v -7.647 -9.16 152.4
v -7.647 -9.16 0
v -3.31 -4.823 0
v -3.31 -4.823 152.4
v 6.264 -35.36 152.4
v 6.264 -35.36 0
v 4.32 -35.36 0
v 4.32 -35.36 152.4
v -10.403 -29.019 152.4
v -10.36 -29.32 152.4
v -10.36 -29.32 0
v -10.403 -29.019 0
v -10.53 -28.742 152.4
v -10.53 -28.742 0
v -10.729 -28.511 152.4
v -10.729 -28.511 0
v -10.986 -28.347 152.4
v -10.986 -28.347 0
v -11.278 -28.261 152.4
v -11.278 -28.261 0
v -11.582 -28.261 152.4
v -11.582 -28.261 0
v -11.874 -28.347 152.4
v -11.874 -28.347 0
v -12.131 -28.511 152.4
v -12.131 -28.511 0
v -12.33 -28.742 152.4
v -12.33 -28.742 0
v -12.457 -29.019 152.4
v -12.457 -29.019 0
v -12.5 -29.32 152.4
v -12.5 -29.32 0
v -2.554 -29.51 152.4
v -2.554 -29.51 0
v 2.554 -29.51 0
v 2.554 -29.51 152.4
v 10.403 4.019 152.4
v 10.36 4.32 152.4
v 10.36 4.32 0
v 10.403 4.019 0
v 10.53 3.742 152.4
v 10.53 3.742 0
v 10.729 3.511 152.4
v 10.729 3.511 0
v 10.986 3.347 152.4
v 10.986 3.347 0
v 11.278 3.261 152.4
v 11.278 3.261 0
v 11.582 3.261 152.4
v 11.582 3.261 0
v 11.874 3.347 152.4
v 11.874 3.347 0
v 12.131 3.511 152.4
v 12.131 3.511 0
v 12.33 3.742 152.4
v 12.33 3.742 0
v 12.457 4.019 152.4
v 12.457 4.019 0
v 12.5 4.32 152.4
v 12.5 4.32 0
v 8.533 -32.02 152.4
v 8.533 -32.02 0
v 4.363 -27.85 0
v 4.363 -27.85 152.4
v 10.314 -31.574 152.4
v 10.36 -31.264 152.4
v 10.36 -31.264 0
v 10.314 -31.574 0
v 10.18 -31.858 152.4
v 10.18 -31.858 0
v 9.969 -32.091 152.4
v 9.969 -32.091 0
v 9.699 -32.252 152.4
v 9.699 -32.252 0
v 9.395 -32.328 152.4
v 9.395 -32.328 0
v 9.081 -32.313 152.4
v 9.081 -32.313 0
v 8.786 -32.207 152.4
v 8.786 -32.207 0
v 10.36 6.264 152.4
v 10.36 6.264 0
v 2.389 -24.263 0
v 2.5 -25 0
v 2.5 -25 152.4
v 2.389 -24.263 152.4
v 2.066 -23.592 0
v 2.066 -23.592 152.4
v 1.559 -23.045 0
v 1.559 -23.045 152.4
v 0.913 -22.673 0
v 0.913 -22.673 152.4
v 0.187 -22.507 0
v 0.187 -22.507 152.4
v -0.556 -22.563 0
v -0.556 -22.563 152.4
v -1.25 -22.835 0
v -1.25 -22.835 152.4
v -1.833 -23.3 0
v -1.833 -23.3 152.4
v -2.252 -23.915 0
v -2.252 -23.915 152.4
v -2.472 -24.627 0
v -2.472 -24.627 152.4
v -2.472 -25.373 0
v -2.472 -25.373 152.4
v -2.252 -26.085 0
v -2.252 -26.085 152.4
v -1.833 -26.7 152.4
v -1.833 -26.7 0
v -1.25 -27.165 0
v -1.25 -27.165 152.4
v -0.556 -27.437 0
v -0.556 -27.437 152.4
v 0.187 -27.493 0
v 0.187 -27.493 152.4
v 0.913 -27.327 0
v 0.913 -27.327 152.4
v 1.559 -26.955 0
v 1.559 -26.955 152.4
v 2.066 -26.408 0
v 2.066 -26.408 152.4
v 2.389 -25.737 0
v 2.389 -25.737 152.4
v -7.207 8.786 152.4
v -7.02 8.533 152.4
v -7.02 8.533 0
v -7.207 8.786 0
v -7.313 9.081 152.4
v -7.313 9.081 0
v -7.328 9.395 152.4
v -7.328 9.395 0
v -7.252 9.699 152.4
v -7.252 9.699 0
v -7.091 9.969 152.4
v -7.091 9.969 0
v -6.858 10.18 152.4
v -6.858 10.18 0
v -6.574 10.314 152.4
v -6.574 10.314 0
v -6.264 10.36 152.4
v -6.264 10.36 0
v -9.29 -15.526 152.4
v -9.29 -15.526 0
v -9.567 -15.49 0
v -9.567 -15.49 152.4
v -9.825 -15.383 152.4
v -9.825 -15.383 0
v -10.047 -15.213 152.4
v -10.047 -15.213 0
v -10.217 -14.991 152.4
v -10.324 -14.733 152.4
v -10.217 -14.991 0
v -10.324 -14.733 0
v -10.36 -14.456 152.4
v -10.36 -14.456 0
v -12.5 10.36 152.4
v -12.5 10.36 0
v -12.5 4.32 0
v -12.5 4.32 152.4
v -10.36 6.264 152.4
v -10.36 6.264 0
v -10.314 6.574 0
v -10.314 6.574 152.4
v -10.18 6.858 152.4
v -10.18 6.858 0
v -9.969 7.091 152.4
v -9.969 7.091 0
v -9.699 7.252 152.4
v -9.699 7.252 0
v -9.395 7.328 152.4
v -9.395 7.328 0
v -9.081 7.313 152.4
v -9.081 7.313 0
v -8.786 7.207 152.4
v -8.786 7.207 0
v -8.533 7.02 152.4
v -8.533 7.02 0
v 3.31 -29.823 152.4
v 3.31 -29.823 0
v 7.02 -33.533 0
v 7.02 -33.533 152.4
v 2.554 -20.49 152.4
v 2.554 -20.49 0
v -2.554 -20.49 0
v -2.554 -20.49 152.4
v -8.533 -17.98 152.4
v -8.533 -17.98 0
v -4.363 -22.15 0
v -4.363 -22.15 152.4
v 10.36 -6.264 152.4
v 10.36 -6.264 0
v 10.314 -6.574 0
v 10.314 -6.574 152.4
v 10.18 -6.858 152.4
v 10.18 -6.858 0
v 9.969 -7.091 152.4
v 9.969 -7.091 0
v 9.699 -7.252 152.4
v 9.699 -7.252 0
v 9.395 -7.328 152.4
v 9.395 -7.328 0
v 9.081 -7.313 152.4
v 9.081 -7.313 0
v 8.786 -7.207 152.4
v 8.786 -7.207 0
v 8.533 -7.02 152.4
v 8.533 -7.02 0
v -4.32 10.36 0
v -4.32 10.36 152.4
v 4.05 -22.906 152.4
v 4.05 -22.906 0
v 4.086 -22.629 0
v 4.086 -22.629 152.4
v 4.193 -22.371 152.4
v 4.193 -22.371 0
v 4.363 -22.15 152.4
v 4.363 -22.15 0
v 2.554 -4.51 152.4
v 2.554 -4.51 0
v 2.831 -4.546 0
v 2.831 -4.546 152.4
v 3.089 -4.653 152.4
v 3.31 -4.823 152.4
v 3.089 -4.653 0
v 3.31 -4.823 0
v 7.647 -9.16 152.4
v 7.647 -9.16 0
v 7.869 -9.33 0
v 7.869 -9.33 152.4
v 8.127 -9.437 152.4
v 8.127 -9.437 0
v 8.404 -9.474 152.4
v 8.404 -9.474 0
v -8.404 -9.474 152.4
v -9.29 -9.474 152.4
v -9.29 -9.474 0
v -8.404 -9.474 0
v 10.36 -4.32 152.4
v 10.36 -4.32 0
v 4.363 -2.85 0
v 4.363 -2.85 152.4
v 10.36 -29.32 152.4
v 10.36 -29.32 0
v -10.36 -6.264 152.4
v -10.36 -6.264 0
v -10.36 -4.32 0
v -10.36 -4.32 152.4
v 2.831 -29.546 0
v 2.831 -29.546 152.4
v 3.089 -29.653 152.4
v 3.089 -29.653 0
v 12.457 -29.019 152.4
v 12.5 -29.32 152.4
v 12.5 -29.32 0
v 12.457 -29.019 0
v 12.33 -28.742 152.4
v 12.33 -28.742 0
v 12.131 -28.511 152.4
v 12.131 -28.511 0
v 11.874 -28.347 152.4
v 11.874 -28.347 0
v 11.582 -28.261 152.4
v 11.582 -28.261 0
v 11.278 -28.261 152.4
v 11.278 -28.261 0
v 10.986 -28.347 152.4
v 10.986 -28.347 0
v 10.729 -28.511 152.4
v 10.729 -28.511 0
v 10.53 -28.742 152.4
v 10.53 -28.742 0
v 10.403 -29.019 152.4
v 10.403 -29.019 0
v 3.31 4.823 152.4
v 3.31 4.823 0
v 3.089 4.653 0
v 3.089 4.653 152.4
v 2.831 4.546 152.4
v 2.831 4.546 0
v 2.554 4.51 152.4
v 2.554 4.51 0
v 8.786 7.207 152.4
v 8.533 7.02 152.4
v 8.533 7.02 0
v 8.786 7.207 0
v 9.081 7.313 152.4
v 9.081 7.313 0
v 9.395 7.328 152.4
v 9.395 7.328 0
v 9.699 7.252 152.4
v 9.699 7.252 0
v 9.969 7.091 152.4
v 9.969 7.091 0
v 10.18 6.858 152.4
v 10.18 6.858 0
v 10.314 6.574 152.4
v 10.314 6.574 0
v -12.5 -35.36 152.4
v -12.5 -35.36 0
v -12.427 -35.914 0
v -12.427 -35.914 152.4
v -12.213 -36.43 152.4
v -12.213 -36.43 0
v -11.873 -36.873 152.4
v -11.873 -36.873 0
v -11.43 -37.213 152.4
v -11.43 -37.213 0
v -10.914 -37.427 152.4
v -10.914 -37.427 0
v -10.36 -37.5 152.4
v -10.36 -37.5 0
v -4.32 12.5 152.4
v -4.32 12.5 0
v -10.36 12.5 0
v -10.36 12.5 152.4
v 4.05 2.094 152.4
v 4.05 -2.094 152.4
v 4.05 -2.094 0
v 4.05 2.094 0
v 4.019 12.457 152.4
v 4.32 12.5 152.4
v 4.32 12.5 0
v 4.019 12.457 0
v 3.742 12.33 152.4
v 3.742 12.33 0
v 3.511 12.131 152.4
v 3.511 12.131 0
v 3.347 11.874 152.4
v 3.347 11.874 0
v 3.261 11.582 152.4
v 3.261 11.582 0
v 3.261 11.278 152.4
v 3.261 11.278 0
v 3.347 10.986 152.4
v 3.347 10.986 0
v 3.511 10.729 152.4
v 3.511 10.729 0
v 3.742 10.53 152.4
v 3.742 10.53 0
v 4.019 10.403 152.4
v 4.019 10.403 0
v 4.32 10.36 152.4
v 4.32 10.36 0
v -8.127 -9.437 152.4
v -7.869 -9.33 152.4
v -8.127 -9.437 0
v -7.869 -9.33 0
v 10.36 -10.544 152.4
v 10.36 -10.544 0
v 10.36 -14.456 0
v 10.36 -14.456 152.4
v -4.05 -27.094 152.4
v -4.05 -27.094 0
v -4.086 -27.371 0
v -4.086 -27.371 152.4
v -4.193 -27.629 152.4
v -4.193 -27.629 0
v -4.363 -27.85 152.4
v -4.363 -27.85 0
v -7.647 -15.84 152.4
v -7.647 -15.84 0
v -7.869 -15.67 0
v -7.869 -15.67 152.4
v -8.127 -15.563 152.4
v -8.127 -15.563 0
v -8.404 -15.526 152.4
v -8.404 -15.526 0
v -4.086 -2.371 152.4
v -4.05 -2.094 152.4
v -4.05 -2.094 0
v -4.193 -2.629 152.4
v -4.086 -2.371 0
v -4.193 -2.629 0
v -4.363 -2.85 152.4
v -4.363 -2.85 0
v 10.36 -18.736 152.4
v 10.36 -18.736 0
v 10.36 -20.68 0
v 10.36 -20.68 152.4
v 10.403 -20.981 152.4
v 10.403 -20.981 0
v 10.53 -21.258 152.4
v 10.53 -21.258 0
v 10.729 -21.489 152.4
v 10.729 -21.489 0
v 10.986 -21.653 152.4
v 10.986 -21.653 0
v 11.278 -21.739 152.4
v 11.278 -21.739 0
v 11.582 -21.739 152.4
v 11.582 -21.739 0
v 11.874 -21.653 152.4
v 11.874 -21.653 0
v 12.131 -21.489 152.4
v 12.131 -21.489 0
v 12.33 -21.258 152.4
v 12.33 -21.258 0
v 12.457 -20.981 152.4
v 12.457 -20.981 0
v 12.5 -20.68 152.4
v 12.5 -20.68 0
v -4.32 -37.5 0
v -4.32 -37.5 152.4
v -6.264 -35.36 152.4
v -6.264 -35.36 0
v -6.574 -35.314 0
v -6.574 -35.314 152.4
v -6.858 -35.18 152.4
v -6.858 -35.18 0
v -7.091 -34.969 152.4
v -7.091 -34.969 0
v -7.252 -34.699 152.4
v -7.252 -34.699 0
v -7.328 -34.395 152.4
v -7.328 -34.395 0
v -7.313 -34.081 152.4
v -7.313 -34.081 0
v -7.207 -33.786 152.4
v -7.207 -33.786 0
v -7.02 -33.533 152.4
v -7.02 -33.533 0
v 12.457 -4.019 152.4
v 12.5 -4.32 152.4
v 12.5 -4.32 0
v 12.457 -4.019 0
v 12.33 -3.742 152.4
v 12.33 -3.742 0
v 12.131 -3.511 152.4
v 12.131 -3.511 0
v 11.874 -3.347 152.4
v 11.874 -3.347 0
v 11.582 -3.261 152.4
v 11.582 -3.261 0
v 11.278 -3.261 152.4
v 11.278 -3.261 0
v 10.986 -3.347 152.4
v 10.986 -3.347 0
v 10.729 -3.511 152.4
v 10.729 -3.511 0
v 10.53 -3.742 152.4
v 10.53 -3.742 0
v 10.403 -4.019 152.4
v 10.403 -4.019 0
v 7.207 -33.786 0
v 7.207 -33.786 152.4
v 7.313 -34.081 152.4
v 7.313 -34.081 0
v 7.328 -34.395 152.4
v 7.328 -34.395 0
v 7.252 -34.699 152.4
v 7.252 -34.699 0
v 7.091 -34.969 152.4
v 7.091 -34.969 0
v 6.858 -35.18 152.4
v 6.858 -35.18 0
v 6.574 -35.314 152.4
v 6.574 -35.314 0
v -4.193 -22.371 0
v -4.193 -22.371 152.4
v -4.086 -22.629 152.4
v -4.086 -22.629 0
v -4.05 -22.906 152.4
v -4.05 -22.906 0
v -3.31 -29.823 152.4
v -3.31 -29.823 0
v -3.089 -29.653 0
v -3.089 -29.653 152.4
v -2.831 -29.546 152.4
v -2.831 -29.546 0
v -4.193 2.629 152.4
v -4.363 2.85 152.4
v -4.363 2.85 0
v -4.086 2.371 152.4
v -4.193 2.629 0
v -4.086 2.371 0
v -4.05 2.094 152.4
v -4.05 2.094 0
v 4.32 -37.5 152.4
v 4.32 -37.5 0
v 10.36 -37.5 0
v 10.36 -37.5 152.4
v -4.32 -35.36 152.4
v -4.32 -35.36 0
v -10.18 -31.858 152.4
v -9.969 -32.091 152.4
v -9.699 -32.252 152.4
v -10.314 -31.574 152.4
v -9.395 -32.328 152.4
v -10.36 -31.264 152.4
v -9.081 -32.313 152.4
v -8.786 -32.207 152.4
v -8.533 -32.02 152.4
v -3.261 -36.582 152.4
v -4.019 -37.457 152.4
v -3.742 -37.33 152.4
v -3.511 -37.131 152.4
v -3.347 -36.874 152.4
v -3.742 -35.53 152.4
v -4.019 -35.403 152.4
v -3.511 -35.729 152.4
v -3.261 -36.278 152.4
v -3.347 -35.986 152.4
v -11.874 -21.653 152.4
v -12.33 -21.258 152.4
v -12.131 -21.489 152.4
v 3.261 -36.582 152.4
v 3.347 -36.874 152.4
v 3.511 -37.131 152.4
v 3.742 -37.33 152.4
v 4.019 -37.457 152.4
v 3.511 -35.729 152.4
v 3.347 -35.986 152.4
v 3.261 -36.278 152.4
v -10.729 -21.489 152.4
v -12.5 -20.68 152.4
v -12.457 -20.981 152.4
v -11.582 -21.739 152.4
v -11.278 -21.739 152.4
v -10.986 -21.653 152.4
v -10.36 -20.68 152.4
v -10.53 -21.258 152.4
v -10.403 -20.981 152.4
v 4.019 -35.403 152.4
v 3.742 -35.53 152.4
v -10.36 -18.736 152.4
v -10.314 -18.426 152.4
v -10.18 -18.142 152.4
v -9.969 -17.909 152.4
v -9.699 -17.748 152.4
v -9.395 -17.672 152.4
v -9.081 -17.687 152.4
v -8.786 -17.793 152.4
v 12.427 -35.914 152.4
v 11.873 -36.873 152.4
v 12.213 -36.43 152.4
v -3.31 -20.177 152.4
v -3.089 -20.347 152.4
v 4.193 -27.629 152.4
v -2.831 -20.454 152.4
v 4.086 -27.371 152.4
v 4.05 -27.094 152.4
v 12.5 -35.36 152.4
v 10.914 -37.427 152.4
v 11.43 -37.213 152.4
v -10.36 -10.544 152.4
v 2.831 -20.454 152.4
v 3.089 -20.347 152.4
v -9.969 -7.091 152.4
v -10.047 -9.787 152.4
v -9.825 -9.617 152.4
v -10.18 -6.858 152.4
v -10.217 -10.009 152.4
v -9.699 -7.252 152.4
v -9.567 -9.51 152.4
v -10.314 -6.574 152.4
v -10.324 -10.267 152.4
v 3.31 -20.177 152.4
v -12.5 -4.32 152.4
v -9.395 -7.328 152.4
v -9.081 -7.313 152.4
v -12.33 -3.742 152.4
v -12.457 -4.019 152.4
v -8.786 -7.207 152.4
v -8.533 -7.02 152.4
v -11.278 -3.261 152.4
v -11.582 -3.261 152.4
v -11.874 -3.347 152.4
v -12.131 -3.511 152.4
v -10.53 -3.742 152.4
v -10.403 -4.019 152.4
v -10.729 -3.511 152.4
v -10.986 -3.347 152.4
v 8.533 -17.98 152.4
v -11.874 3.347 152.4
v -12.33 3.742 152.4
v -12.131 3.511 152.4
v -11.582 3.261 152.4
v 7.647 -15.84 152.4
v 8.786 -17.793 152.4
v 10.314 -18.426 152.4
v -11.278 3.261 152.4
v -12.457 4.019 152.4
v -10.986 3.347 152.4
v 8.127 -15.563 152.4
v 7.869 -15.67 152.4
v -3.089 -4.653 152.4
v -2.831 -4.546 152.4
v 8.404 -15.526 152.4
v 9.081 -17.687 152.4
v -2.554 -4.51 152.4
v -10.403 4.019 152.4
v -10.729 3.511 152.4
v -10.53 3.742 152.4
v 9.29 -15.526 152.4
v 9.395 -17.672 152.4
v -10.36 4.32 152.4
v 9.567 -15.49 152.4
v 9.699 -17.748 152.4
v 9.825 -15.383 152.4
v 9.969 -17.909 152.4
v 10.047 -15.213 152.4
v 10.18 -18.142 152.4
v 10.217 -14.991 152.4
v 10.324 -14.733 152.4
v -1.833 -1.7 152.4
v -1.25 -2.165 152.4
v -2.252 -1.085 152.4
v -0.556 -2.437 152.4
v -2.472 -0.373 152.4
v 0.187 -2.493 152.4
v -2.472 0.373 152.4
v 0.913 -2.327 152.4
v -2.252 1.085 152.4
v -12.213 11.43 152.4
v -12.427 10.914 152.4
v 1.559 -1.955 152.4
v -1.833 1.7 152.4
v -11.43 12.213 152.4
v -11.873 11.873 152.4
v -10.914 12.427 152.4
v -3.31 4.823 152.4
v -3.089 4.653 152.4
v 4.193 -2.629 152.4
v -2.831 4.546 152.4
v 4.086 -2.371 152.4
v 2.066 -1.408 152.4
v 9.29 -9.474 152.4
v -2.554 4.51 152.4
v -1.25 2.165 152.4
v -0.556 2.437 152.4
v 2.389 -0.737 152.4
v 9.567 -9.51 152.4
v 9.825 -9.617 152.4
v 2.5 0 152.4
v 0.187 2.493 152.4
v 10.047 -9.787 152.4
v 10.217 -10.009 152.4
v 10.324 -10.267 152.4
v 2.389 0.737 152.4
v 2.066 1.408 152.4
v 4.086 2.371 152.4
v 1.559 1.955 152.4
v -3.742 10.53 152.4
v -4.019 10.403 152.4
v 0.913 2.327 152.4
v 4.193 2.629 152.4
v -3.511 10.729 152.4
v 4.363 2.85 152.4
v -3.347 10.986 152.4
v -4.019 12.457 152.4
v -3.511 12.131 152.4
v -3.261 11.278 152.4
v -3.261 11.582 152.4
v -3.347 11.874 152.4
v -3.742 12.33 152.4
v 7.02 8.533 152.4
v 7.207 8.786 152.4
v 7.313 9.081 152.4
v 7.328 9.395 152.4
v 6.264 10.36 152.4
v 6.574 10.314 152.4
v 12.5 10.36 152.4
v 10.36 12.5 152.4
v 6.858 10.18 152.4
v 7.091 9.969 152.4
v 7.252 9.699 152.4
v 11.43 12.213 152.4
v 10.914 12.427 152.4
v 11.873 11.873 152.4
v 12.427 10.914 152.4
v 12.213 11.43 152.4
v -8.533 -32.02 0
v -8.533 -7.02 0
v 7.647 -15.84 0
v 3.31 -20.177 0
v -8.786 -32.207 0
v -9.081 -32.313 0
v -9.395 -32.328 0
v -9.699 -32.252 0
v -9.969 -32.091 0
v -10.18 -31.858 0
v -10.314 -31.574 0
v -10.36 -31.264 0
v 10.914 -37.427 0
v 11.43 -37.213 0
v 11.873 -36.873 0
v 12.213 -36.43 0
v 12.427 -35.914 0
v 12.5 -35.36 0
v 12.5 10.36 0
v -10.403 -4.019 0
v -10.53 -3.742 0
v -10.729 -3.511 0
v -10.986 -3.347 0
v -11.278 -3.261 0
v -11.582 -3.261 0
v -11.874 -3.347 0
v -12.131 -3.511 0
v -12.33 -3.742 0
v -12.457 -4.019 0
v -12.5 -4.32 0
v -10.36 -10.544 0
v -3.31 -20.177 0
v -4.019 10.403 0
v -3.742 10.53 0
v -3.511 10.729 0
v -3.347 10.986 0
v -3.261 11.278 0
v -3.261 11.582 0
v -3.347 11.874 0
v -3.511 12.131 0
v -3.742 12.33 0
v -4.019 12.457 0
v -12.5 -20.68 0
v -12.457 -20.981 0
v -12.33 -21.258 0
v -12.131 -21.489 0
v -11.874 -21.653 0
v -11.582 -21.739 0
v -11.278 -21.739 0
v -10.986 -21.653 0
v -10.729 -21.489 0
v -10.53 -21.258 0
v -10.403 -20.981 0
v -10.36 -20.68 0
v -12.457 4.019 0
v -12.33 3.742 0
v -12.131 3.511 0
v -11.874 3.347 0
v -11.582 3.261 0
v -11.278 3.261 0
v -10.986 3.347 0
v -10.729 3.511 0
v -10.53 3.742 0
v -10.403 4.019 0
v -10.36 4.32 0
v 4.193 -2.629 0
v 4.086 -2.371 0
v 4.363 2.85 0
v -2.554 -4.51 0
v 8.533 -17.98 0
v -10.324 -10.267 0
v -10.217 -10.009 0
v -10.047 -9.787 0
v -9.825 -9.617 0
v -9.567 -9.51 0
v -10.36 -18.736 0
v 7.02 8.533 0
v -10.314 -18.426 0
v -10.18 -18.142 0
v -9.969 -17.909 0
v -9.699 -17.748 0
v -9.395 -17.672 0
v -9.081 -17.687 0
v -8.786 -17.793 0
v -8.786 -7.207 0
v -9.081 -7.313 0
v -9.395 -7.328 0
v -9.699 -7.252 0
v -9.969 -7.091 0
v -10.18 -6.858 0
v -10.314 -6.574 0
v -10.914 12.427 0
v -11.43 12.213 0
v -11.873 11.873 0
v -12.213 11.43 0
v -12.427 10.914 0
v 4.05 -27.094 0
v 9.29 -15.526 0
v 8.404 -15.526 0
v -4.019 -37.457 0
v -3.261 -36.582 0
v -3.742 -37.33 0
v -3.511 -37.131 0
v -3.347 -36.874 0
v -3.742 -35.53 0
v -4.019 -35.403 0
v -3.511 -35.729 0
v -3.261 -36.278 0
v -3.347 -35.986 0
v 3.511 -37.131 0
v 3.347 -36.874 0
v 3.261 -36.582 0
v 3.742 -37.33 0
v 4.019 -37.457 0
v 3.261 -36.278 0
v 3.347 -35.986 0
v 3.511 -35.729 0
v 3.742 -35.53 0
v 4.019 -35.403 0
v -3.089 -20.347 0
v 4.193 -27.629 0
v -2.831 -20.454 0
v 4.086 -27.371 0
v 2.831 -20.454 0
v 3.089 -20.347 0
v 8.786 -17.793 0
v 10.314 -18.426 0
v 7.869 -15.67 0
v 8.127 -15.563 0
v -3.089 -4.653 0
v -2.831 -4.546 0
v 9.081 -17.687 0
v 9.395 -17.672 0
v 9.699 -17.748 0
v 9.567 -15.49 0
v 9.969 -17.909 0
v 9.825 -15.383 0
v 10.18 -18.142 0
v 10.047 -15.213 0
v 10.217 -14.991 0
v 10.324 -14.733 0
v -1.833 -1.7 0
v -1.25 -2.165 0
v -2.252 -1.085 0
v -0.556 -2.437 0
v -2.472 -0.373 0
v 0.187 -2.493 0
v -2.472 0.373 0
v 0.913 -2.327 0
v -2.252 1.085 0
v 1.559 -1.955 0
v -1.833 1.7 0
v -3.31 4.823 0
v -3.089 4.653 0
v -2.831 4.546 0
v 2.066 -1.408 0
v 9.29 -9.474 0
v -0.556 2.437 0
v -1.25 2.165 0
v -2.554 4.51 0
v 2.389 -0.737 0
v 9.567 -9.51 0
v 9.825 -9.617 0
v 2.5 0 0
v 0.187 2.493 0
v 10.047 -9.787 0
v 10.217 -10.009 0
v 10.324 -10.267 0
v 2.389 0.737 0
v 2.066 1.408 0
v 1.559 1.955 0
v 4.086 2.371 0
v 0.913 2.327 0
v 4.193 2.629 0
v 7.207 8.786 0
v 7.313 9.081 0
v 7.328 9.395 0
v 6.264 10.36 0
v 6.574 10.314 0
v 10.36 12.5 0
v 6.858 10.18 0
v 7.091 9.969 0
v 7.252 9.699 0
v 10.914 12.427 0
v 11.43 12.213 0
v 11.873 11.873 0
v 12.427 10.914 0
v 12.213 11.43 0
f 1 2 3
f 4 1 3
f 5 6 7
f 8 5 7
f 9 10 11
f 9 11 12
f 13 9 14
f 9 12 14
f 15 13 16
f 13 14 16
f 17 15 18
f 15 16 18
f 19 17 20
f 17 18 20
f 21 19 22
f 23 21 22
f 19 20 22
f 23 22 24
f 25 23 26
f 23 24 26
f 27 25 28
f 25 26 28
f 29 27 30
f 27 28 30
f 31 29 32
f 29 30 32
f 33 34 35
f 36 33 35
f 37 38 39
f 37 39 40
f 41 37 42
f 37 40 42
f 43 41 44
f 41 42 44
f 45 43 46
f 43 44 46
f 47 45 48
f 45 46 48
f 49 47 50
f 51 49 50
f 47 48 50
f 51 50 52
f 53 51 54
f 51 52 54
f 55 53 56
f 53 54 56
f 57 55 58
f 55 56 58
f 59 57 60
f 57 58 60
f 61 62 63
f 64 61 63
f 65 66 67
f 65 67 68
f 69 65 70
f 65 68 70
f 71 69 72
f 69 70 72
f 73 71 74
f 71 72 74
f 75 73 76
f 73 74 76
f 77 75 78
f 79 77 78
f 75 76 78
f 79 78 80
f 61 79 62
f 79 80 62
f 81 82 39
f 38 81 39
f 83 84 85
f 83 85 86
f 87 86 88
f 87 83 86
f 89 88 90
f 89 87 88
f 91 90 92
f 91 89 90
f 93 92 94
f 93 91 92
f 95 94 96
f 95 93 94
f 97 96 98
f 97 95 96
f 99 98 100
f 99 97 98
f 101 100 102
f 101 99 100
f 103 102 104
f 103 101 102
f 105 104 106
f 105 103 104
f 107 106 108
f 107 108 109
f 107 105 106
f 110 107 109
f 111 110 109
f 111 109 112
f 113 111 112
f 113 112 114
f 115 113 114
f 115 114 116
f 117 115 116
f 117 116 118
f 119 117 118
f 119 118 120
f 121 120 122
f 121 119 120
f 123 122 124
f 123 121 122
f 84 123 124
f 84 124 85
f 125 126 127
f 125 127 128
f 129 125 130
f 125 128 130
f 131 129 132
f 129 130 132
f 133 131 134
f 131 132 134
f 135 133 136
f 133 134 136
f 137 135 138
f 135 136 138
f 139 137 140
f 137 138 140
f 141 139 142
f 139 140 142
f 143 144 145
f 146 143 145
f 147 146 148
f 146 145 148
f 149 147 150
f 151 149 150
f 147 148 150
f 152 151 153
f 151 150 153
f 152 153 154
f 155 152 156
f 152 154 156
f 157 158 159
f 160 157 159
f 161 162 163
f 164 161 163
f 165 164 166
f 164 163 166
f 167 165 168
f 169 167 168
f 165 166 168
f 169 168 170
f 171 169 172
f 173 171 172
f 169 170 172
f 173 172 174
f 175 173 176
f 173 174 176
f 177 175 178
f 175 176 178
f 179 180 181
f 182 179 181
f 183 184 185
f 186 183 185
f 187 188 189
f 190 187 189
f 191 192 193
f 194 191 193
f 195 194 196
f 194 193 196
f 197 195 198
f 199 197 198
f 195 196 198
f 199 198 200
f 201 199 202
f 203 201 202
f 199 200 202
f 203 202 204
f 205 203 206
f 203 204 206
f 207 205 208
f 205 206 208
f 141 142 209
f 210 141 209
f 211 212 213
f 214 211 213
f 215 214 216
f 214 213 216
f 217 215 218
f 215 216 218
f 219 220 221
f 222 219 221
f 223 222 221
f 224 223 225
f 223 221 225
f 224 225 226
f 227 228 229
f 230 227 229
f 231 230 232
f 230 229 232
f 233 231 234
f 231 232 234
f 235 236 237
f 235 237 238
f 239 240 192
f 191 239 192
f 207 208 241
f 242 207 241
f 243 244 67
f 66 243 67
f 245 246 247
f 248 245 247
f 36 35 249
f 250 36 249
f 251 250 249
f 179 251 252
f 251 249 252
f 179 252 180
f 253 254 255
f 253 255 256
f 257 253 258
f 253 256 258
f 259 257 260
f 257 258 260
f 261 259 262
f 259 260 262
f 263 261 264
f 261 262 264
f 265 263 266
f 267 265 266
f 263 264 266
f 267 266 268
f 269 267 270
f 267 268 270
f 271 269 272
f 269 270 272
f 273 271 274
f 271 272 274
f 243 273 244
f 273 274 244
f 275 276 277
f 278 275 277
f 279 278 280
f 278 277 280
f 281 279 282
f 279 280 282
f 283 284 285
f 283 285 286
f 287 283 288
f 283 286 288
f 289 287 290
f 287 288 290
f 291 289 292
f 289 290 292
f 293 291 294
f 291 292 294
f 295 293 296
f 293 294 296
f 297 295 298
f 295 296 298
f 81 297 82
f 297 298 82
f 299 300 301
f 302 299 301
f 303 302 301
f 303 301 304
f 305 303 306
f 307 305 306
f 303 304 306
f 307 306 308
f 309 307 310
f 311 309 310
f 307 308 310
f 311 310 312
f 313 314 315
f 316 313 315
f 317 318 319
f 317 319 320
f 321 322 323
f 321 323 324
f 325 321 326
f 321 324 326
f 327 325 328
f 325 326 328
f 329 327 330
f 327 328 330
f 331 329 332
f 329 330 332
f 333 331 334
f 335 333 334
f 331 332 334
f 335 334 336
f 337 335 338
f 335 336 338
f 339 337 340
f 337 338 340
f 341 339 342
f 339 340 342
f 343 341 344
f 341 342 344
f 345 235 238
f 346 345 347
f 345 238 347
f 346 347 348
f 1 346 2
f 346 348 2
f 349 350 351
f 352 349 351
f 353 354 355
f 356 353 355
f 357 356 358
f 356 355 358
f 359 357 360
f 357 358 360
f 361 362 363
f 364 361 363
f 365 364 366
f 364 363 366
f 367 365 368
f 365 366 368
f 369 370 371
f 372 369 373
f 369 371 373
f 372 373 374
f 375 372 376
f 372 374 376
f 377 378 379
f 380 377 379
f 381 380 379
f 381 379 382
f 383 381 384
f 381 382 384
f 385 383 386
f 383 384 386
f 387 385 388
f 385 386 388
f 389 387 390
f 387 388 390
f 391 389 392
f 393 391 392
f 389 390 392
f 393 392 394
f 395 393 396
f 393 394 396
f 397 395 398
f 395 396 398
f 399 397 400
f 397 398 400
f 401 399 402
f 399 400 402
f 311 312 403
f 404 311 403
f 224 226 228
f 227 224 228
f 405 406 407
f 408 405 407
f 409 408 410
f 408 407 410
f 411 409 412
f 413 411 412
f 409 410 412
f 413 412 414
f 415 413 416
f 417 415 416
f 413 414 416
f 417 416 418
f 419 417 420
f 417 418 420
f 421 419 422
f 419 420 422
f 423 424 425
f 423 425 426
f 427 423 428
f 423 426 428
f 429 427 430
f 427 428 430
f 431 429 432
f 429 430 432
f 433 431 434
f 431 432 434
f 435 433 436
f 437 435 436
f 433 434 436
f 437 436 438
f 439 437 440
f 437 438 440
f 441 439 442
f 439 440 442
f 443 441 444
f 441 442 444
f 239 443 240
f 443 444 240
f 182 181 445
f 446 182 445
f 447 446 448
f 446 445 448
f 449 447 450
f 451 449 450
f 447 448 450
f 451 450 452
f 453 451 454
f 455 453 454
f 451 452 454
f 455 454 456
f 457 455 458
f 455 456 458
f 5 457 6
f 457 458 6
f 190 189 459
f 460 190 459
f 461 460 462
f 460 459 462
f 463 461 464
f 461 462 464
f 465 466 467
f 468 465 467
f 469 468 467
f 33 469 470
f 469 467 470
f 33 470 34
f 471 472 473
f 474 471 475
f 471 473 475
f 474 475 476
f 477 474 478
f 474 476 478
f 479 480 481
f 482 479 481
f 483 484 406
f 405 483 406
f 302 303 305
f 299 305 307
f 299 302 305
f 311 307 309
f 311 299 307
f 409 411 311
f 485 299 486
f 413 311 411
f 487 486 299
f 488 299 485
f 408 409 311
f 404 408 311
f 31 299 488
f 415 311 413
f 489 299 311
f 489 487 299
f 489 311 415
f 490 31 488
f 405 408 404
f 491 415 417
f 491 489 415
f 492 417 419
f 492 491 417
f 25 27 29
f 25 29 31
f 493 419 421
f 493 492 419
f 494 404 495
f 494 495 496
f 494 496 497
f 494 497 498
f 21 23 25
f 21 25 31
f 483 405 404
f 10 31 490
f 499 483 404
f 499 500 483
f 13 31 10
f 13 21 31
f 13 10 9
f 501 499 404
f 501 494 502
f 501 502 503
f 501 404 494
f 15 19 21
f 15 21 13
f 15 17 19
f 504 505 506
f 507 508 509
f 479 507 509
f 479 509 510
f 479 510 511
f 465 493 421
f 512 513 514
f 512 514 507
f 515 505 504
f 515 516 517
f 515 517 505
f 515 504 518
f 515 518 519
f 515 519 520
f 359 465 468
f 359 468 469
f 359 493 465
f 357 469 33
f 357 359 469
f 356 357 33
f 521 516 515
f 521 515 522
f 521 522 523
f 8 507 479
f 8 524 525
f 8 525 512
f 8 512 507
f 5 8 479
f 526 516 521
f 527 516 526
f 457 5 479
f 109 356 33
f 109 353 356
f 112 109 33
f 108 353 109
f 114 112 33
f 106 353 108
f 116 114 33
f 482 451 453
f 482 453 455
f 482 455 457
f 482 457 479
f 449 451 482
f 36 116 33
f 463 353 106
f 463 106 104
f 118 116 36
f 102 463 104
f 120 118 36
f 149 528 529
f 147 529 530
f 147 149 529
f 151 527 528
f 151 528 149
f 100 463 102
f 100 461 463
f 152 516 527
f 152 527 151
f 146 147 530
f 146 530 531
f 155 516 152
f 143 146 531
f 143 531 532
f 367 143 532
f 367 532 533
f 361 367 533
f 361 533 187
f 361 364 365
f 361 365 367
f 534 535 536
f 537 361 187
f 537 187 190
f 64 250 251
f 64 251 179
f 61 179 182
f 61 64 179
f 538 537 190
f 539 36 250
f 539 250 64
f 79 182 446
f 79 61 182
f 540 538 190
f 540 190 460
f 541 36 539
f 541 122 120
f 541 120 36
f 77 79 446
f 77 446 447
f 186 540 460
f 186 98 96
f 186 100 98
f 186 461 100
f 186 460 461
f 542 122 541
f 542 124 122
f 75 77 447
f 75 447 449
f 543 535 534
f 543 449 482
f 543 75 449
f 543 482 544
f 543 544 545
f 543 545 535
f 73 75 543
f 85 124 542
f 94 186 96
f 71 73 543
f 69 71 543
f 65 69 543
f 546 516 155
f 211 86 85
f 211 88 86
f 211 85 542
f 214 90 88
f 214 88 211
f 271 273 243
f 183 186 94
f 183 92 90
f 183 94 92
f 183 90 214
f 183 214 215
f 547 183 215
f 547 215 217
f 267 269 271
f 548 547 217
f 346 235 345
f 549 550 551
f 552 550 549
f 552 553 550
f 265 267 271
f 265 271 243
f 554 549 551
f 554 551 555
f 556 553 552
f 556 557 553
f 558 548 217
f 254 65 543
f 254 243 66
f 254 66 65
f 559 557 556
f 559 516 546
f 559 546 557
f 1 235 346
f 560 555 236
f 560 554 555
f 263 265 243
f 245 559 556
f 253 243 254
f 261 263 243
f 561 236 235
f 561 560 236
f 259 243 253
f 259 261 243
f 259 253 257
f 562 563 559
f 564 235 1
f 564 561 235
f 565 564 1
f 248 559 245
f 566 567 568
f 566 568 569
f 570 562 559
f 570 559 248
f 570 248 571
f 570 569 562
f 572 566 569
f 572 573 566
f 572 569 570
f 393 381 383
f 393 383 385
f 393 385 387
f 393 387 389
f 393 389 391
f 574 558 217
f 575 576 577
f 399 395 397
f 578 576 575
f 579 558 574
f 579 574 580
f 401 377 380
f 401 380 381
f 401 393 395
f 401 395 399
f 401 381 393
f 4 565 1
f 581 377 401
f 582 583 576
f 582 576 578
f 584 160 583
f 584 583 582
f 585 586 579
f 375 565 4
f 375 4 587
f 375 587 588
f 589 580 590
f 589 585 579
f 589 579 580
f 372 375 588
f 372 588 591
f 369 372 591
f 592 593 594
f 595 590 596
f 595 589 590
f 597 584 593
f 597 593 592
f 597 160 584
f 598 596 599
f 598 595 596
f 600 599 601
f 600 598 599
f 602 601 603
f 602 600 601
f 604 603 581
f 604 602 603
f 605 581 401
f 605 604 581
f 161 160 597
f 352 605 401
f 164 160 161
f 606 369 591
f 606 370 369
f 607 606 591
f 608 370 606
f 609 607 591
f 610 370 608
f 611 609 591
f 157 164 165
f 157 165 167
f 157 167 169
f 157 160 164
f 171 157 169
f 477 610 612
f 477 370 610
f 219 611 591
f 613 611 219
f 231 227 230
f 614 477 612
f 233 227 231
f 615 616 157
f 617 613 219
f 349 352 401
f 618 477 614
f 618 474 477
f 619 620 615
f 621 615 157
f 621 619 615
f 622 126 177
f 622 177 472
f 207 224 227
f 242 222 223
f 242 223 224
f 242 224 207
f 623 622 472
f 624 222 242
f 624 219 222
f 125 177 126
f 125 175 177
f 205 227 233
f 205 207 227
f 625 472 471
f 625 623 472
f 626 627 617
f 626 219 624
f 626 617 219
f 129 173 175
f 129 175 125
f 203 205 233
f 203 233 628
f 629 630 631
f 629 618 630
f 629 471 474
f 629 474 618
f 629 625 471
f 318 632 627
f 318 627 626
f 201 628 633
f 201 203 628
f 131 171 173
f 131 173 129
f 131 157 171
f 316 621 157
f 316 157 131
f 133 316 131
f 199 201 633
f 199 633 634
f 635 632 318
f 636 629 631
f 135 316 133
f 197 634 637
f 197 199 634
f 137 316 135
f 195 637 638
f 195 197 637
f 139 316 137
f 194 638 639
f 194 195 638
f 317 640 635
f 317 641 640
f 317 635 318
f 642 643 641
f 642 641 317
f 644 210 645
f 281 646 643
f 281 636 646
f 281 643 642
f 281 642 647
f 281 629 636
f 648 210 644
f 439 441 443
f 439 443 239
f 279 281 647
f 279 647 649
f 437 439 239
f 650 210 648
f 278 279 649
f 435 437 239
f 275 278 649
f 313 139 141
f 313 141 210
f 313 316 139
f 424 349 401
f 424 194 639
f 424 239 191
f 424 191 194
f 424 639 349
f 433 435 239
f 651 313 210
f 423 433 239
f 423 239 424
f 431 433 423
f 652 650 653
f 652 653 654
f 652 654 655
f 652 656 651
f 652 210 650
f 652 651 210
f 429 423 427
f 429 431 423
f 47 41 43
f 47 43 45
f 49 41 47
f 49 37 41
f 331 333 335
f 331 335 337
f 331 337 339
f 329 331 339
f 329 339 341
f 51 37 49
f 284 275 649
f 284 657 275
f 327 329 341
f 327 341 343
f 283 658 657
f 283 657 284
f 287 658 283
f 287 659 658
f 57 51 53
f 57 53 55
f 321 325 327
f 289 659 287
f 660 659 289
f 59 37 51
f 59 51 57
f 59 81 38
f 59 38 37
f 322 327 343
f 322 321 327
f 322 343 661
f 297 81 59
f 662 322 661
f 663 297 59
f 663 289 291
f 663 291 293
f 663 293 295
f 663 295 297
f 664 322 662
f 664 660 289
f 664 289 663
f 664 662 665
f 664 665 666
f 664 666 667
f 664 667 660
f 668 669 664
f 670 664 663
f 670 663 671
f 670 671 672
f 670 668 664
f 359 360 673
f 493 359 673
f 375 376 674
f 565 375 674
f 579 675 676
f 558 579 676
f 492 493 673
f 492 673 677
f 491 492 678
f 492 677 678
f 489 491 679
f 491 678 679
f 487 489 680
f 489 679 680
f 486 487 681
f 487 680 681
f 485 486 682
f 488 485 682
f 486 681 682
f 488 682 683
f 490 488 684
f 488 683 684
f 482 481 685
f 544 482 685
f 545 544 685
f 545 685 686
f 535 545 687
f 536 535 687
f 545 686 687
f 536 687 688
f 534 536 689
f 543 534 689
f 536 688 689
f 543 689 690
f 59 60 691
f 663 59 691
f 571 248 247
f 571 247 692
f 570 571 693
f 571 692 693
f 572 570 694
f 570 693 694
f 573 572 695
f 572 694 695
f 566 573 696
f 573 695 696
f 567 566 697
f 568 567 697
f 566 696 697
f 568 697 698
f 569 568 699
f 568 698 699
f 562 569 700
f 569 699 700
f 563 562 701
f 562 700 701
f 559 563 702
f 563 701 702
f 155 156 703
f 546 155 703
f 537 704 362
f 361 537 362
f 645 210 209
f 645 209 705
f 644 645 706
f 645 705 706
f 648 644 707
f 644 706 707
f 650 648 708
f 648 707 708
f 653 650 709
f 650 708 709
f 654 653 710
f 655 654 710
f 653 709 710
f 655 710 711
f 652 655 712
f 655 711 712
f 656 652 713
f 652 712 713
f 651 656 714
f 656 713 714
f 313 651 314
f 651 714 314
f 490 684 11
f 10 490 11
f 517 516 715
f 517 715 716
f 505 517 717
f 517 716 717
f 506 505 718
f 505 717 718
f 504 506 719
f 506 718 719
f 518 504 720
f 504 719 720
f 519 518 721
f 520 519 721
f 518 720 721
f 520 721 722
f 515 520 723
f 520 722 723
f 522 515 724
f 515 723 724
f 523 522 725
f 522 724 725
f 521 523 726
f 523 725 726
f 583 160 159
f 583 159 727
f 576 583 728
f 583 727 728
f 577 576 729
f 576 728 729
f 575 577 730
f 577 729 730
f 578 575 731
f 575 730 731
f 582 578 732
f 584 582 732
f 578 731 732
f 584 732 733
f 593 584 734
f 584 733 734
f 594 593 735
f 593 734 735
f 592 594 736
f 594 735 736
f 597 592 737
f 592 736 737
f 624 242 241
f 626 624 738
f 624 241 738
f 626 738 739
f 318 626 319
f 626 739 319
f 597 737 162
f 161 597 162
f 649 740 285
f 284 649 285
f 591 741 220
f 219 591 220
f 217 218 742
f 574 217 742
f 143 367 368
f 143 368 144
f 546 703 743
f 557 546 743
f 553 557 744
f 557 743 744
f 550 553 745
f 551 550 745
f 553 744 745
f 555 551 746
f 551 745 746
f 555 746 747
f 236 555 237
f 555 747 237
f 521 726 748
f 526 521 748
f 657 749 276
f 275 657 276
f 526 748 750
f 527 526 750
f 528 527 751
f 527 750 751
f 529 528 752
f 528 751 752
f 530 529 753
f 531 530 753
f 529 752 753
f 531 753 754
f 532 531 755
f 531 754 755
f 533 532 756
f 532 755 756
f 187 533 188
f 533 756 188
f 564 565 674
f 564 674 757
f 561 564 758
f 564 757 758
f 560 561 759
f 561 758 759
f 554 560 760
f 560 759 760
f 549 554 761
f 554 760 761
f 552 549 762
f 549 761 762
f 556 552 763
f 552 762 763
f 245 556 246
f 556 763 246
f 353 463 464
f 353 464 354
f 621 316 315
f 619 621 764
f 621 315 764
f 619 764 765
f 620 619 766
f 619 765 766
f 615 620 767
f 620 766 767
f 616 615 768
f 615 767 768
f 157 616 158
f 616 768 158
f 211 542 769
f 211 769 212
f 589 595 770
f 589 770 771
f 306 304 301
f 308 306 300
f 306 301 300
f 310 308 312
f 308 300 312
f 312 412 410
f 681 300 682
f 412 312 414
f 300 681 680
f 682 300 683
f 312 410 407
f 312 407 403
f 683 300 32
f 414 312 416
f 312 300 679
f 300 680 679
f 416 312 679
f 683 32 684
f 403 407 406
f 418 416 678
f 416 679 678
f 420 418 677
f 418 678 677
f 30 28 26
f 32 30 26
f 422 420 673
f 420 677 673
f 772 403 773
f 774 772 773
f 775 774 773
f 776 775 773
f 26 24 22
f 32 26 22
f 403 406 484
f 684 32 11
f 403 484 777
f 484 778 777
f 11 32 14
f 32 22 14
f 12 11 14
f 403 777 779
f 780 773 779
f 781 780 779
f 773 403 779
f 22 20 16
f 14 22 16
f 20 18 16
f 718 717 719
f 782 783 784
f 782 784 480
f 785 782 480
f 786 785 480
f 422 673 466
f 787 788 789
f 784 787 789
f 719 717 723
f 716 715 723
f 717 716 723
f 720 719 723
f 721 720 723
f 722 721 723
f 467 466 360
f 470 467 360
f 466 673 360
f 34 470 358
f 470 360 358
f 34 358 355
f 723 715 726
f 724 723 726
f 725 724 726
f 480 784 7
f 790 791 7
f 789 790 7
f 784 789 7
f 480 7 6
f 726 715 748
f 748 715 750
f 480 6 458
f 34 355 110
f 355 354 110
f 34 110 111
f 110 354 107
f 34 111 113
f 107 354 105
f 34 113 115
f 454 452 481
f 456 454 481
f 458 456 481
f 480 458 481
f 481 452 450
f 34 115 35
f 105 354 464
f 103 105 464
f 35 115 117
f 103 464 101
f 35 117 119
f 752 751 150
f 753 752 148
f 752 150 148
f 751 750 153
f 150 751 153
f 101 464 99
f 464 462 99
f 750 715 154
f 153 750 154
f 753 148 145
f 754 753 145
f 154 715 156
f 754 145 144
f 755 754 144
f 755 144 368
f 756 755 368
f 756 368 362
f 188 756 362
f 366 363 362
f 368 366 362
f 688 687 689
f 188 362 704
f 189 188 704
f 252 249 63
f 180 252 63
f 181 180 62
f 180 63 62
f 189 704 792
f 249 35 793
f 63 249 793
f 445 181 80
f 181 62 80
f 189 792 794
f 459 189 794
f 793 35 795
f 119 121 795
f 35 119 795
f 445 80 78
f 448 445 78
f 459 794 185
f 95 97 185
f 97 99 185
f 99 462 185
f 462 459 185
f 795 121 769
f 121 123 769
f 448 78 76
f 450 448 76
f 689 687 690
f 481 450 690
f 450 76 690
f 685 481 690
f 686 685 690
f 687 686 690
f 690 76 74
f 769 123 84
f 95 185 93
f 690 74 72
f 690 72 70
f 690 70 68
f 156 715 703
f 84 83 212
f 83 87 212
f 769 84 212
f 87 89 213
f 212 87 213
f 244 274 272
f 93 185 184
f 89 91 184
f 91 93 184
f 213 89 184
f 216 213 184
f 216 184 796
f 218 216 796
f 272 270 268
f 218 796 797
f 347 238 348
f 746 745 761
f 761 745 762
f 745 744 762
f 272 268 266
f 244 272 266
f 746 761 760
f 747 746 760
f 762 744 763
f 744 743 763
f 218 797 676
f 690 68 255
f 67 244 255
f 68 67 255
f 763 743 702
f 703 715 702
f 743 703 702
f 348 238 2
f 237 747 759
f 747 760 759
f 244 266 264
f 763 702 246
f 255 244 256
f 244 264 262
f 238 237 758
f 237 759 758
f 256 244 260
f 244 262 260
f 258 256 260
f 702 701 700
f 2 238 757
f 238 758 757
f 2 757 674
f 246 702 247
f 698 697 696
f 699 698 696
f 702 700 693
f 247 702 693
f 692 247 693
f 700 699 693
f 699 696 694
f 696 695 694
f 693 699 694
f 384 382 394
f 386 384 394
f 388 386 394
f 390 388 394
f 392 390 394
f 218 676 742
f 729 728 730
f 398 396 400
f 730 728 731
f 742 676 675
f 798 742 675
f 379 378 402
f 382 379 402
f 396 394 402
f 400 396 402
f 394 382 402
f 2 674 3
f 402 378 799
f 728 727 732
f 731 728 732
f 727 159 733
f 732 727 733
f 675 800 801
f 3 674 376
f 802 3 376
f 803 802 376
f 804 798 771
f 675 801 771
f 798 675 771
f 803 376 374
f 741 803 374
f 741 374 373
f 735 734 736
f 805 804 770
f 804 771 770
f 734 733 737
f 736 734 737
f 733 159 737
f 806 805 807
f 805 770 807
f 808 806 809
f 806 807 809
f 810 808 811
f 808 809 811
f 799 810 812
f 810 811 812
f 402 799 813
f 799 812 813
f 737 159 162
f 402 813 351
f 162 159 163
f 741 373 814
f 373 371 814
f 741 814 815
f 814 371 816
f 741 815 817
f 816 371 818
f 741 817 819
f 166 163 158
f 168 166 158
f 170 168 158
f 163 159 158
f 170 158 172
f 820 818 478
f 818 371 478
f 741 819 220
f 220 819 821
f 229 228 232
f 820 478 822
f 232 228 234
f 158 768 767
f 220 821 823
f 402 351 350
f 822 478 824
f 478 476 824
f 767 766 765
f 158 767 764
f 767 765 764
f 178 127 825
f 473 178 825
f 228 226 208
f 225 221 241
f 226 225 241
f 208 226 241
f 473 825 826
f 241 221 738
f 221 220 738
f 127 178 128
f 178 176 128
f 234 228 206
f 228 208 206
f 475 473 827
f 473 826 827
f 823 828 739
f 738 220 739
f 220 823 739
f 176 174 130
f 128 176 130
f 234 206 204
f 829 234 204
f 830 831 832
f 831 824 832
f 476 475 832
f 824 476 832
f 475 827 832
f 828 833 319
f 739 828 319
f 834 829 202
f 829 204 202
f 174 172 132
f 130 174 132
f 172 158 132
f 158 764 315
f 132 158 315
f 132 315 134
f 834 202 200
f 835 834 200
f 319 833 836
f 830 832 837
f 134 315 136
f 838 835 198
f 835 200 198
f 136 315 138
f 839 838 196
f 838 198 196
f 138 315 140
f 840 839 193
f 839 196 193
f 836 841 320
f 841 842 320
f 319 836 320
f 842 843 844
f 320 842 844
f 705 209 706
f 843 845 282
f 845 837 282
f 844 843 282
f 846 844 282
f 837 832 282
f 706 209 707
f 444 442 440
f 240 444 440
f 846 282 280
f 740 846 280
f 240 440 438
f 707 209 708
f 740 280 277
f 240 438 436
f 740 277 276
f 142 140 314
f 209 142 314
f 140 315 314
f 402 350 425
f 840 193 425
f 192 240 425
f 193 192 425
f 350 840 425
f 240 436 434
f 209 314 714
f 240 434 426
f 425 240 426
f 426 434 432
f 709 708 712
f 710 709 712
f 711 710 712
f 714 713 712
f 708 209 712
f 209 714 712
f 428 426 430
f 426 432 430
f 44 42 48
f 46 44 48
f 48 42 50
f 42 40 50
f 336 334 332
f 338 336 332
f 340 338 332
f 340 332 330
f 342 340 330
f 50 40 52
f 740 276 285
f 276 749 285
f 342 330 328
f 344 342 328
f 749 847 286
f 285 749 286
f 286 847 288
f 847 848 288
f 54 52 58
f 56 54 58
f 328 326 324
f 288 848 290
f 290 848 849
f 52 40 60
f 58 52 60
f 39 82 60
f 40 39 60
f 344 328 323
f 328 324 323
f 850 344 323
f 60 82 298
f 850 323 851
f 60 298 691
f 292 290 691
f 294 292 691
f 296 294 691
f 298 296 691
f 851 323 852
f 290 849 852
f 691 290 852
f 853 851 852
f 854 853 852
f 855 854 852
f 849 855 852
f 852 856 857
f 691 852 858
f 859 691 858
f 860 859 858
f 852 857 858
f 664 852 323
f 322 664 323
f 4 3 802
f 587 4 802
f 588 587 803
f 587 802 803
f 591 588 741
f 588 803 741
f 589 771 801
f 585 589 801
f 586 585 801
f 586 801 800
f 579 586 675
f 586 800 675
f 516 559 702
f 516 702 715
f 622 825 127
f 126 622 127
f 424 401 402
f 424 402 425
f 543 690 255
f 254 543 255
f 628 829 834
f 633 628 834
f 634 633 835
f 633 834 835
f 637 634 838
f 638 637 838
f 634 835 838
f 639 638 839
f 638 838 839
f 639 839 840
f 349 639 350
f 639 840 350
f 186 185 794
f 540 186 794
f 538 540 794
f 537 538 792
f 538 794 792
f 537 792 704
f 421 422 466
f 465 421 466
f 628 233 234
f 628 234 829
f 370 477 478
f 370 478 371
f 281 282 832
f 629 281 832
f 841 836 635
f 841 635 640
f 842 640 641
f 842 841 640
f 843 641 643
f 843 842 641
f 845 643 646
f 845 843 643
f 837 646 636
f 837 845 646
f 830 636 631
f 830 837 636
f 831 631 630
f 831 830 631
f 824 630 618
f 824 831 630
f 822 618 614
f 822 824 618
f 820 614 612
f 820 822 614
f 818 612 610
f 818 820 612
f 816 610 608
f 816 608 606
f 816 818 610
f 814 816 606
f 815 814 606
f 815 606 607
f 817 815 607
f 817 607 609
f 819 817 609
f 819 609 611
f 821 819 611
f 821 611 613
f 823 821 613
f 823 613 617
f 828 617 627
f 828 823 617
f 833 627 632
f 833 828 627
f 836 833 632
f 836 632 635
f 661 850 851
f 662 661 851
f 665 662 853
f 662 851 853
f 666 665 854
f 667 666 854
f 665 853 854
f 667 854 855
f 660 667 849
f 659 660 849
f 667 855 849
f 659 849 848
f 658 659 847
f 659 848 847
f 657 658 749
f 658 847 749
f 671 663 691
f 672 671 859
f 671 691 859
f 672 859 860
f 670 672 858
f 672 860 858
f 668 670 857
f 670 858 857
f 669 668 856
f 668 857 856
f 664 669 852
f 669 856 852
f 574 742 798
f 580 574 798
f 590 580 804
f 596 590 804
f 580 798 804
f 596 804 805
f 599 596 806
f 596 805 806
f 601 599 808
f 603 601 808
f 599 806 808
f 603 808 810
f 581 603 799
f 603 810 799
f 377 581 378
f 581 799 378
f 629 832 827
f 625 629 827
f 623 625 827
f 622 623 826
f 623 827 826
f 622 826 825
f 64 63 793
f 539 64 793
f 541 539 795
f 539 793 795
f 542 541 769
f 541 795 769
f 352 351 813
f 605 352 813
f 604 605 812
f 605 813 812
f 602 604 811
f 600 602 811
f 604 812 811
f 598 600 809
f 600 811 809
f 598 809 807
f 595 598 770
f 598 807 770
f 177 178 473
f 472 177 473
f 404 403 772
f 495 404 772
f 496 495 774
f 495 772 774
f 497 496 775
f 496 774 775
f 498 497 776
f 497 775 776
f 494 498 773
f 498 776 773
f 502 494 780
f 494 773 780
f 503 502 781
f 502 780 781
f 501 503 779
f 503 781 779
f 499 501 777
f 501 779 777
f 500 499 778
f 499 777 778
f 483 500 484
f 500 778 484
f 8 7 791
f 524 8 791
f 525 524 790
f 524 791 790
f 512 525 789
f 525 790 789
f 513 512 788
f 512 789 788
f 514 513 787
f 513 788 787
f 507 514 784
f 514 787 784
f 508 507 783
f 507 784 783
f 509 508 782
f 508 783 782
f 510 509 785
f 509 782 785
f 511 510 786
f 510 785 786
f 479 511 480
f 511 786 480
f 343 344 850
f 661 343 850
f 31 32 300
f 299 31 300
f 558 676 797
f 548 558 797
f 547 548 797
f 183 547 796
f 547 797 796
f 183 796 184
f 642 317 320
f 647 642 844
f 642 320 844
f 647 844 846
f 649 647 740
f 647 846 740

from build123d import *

# Parameters (mm, degrees)
F0_R     = 2.5
F1_DEPTH = 152.4


with BuildPart() as f1:
    # F0 (on Top) → F1 (new body)
    with BuildSketch(Plane.XY):
        with BuildLine():
            ThreePointArc((-10.36, 12.5), (-11.873209, 11.873209), (-12.5, 10.36))
            Line((-12.5, 10.36), (-12.5, 4.32))
            ThreePointArc((-12.5, 4.32), (-11.43, 3.25), (-10.36, 4.32))
            Line((-10.36, 4.32), (-10.36, 6.263583))
            ThreePointArc((-10.36, 6.263583), (-9.699471, 7.252134), (-8.533396, 7.020187))
            Line((-8.533396, 7.020187), (-4.363396, 2.850187))
            ThreePointArc((-4.363396, 2.850187), (-4.131449, 2.503054), (-4.05, 2.093583))
            Line((-4.05, 2.093583), (-4.05, 0))
            Line((-4.05, 0), (-4.05, -2.093583))
            ThreePointArc((-4.05, -2.093583), (-4.131449, -2.503054), (-4.363396, -2.850187))
            Line((-4.363396, -2.850187), (-8.533396, -7.020187))
            ThreePointArc((-8.533396, -7.020187), (-9.699471, -7.252134), (-10.36, -6.263583))
            Line((-10.36, -6.263583), (-10.36, -4.32))
            ThreePointArc((-10.36, -4.32), (-11.43, -3.25), (-12.5, -4.32))
            Line((-12.5, -4.32), (-12.5, -12.5))
            Line((-12.5, -12.5), (-12.5, -20.68))
            ThreePointArc((-12.5, -20.68), (-11.43, -21.75), (-10.36, -20.68))
            Line((-10.36, -20.68), (-10.36, -18.736417))
            ThreePointArc((-10.36, -18.736417), (-9.699471, -17.747866), (-8.533396, -17.979813))
            Line((-8.533396, -17.979813), (-4.363396, -22.149813))
            ThreePointArc((-4.363396, -22.149813), (-4.131449, -22.496946), (-4.05, -22.906417))
            Line((-4.05, -22.906417), (-4.05, -25))
            Line((-4.05, -25), (-4.05, -27.093583))
            ThreePointArc((-4.05, -27.093583), (-4.131449, -27.503054), (-4.363396, -27.850187))
            Line((-4.363396, -27.850187), (-8.533396, -32.020187))
            ThreePointArc((-8.533396, -32.020187), (-9.699471, -32.252134), (-10.36, -31.263583))
            Line((-10.36, -31.263583), (-10.36, -29.32))
            ThreePointArc((-10.36, -29.32), (-11.43, -28.25), (-12.5, -29.32))
            Line((-12.5, -29.32), (-12.5, -35.36))
            ThreePointArc((-12.5, -35.36), (-11.873209, -36.873209), (-10.36, -37.5))
            Line((-10.36, -37.5), (-4.32, -37.5))
            ThreePointArc((-4.32, -37.5), (-3.25, -36.43), (-4.32, -35.36))
            Line((-4.32, -35.36), (-6.263583, -35.36))
            ThreePointArc((-6.263583, -35.36), (-7.252134, -34.699471), (-7.020187, -33.533396))
            Line((-7.020187, -33.533396), (-3.310187, -29.823396))
            ThreePointArc((-3.310187, -29.823396), (-2.963054, -29.591449), (-2.553583, -29.51))
            Line((-2.553583, -29.51), (0, -29.51))
            Line((0, -29.51), (2.553583, -29.51))
            ThreePointArc((2.553583, -29.51), (2.963054, -29.591449), (3.310187, -29.823396))
            Line((3.310187, -29.823396), (7.020187, -33.533396))
            ThreePointArc((7.020187, -33.533396), (7.252134, -34.699471), (6.263583, -35.36))
            Line((6.263583, -35.36), (4.32, -35.36))
            ThreePointArc((4.32, -35.36), (3.25, -36.43), (4.32, -37.5))
            Line((4.32, -37.5), (10.36, -37.5))
            ThreePointArc((10.36, -37.5), (11.873209, -36.873209), (12.5, -35.36))
            Line((12.5, -35.36), (12.5, -29.32))
            ThreePointArc((12.5, -29.32), (11.43, -28.25), (10.36, -29.32))
            Line((10.36, -29.32), (10.36, -31.263583))
            ThreePointArc((10.36, -31.263583), (9.699471, -32.252134), (8.533396, -32.020187))
            Line((8.533396, -32.020187), (4.363396, -27.850187))
            ThreePointArc((4.363396, -27.850187), (4.131449, -27.503054), (4.05, -27.093583))
            Line((4.05, -27.093583), (4.05, -25))
            Line((4.05, -25), (4.05, -22.906417))
            ThreePointArc((4.05, -22.906417), (4.131449, -22.496946), (4.363396, -22.149813))
            Line((4.363396, -22.149813), (8.533396, -17.979813))
            ThreePointArc((8.533396, -17.979813), (9.699471, -17.747866), (10.36, -18.736417))
            Line((10.36, -18.736417), (10.36, -20.68))
            ThreePointArc((10.36, -20.68), (11.43, -21.75), (12.5, -20.68))
            Line((12.5, -20.68), (12.5, -12.5))
            Line((12.5, -12.5), (12.5, -4.32))
            ThreePointArc((12.5, -4.32), (11.43, -3.25), (10.36, -4.32))
            Line((10.36, -4.32), (10.36, -6.263583))
            ThreePointArc((10.36, -6.263583), (9.699471, -7.252134), (8.533396, -7.020187))
            Line((8.533396, -7.020187), (4.363396, -2.850187))
            ThreePointArc((4.363396, -2.850187), (4.131449, -2.503054), (4.05, -2.093583))
            Line((4.05, -2.093583), (4.05, 0))
            Line((4.05, 0), (4.05, 2.093583))
            ThreePointArc((4.05, 2.093583), (4.131449, 2.503054), (4.363396, 2.850187))
            Line((4.363396, 2.850187), (8.533396, 7.020187))
            ThreePointArc((8.533396, 7.020187), (9.699471, 7.252134), (10.36, 6.263583))
            Line((10.36, 6.263583), (10.36, 4.32))
            ThreePointArc((10.36, 4.32), (11.43, 3.25), (12.5, 4.32))
            Line((12.5, 4.32), (12.5, 10.36))
            ThreePointArc((12.5, 10.36), (11.873209, 11.873209), (10.36, 12.5))
            Line((10.36, 12.5), (4.32, 12.5))
            ThreePointArc((4.32, 12.5), (3.25, 11.43), (4.32, 10.36))
            Line((4.32, 10.36), (6.263583, 10.36))
            ThreePointArc((6.263583, 10.36), (7.252134, 9.699471), (7.020187, 8.533396))
            Line((7.020187, 8.533396), (3.310187, 4.823396))
            ThreePointArc((3.310187, 4.823396), (2.963054, 4.591449), (2.553583, 4.51))
            Line((2.553583, 4.51), (0, 4.51))
            Line((0, 4.51), (-2.553583, 4.51))
            ThreePointArc((-2.553583, 4.51), (-2.963054, 4.591449), (-3.310187, 4.823396))
            Line((-3.310187, 4.823396), (-7.020187, 8.533396))
            ThreePointArc((-7.020187, 8.533396), (-7.252134, 9.699471), (-6.263583, 10.36))
            Line((-6.263583, 10.36), (-4.32, 10.36))
            ThreePointArc((-4.32, 10.36), (-3.25, 11.43), (-4.32, 12.5))
            Line((-4.32, 12.5), (-10.36, 12.5))
        make_face()
        with Locations((0, -25)):
            Circle(F0_R, mode=Mode.SUBTRACT)
        with BuildLine():
            Line((-2.553583, -4.51), (0, -4.51))
            Line((0, -4.51), (2.553583, -4.51))
            ThreePointArc((2.553583, -4.51), (2.963054, -4.591449), (3.310187, -4.823396))
            Line((3.310187, -4.823396), (7.646979, -9.160187))
            ThreePointArc((7.646979, -9.160187), (7.994112, -9.392134), (8.403583, -9.473583))
            Line((8.403583, -9.473583), (9.29, -9.473583))
            ThreePointArc((9.29, -9.473583), (10.046604, -9.786979), (10.36, -10.543583))
            Line((10.36, -10.543583), (10.36, -12.5))
            Line((10.36, -12.5), (10.36, -14.456417))
            ThreePointArc((10.36, -14.456417), (10.046604, -15.213021), (9.29, -15.526417))
            Line((9.29, -15.526417), (8.403583, -15.526417))
            ThreePointArc((8.403583, -15.526417), (7.994112, -15.607866), (7.646979, -15.839813))
            Line((7.646979, -15.839813), (3.310187, -20.176604))
            ThreePointArc((3.310187, -20.176604), (2.963054, -20.408551), (2.553583, -20.49))
            Line((2.553583, -20.49), (0, -20.49))
            Line((0, -20.49), (-2.553583, -20.49))
            ThreePointArc((-2.553583, -20.49), (-2.963054, -20.408551), (-3.310187, -20.176604))
            Line((-3.310187, -20.176604), (-7.646979, -15.839813))
            ThreePointArc((-7.646979, -15.839813), (-7.994112, -15.607866), (-8.403583, -15.526417))
            Line((-8.403583, -15.526417), (-9.29, -15.526417))
            ThreePointArc((-9.29, -15.526417), (-10.046604, -15.213021), (-10.36, -14.456417))
            Line((-10.36, -14.456417), (-10.36, -12.5))
            Line((-10.36, -12.5), (-10.36, -10.543583))
            ThreePointArc((-10.36, -10.543583), (-10.046604, -9.786979), (-9.29, -9.473583))
            Line((-9.29, -9.473583), (-8.403583, -9.473583))
            ThreePointArc((-8.403583, -9.473583), (-7.994112, -9.392134), (-7.646979, -9.160187))
            Line((-7.646979, -9.160187), (-3.310187, -4.823396))
            ThreePointArc((-3.310187, -4.823396), (-2.963054, -4.591449), (-2.553583, -4.51))
        make_face(mode=Mode.SUBTRACT)
        Circle(F0_R, mode=Mode.SUBTRACT)
    extrude(amount=F1_DEPTH)


solid = f1.part
